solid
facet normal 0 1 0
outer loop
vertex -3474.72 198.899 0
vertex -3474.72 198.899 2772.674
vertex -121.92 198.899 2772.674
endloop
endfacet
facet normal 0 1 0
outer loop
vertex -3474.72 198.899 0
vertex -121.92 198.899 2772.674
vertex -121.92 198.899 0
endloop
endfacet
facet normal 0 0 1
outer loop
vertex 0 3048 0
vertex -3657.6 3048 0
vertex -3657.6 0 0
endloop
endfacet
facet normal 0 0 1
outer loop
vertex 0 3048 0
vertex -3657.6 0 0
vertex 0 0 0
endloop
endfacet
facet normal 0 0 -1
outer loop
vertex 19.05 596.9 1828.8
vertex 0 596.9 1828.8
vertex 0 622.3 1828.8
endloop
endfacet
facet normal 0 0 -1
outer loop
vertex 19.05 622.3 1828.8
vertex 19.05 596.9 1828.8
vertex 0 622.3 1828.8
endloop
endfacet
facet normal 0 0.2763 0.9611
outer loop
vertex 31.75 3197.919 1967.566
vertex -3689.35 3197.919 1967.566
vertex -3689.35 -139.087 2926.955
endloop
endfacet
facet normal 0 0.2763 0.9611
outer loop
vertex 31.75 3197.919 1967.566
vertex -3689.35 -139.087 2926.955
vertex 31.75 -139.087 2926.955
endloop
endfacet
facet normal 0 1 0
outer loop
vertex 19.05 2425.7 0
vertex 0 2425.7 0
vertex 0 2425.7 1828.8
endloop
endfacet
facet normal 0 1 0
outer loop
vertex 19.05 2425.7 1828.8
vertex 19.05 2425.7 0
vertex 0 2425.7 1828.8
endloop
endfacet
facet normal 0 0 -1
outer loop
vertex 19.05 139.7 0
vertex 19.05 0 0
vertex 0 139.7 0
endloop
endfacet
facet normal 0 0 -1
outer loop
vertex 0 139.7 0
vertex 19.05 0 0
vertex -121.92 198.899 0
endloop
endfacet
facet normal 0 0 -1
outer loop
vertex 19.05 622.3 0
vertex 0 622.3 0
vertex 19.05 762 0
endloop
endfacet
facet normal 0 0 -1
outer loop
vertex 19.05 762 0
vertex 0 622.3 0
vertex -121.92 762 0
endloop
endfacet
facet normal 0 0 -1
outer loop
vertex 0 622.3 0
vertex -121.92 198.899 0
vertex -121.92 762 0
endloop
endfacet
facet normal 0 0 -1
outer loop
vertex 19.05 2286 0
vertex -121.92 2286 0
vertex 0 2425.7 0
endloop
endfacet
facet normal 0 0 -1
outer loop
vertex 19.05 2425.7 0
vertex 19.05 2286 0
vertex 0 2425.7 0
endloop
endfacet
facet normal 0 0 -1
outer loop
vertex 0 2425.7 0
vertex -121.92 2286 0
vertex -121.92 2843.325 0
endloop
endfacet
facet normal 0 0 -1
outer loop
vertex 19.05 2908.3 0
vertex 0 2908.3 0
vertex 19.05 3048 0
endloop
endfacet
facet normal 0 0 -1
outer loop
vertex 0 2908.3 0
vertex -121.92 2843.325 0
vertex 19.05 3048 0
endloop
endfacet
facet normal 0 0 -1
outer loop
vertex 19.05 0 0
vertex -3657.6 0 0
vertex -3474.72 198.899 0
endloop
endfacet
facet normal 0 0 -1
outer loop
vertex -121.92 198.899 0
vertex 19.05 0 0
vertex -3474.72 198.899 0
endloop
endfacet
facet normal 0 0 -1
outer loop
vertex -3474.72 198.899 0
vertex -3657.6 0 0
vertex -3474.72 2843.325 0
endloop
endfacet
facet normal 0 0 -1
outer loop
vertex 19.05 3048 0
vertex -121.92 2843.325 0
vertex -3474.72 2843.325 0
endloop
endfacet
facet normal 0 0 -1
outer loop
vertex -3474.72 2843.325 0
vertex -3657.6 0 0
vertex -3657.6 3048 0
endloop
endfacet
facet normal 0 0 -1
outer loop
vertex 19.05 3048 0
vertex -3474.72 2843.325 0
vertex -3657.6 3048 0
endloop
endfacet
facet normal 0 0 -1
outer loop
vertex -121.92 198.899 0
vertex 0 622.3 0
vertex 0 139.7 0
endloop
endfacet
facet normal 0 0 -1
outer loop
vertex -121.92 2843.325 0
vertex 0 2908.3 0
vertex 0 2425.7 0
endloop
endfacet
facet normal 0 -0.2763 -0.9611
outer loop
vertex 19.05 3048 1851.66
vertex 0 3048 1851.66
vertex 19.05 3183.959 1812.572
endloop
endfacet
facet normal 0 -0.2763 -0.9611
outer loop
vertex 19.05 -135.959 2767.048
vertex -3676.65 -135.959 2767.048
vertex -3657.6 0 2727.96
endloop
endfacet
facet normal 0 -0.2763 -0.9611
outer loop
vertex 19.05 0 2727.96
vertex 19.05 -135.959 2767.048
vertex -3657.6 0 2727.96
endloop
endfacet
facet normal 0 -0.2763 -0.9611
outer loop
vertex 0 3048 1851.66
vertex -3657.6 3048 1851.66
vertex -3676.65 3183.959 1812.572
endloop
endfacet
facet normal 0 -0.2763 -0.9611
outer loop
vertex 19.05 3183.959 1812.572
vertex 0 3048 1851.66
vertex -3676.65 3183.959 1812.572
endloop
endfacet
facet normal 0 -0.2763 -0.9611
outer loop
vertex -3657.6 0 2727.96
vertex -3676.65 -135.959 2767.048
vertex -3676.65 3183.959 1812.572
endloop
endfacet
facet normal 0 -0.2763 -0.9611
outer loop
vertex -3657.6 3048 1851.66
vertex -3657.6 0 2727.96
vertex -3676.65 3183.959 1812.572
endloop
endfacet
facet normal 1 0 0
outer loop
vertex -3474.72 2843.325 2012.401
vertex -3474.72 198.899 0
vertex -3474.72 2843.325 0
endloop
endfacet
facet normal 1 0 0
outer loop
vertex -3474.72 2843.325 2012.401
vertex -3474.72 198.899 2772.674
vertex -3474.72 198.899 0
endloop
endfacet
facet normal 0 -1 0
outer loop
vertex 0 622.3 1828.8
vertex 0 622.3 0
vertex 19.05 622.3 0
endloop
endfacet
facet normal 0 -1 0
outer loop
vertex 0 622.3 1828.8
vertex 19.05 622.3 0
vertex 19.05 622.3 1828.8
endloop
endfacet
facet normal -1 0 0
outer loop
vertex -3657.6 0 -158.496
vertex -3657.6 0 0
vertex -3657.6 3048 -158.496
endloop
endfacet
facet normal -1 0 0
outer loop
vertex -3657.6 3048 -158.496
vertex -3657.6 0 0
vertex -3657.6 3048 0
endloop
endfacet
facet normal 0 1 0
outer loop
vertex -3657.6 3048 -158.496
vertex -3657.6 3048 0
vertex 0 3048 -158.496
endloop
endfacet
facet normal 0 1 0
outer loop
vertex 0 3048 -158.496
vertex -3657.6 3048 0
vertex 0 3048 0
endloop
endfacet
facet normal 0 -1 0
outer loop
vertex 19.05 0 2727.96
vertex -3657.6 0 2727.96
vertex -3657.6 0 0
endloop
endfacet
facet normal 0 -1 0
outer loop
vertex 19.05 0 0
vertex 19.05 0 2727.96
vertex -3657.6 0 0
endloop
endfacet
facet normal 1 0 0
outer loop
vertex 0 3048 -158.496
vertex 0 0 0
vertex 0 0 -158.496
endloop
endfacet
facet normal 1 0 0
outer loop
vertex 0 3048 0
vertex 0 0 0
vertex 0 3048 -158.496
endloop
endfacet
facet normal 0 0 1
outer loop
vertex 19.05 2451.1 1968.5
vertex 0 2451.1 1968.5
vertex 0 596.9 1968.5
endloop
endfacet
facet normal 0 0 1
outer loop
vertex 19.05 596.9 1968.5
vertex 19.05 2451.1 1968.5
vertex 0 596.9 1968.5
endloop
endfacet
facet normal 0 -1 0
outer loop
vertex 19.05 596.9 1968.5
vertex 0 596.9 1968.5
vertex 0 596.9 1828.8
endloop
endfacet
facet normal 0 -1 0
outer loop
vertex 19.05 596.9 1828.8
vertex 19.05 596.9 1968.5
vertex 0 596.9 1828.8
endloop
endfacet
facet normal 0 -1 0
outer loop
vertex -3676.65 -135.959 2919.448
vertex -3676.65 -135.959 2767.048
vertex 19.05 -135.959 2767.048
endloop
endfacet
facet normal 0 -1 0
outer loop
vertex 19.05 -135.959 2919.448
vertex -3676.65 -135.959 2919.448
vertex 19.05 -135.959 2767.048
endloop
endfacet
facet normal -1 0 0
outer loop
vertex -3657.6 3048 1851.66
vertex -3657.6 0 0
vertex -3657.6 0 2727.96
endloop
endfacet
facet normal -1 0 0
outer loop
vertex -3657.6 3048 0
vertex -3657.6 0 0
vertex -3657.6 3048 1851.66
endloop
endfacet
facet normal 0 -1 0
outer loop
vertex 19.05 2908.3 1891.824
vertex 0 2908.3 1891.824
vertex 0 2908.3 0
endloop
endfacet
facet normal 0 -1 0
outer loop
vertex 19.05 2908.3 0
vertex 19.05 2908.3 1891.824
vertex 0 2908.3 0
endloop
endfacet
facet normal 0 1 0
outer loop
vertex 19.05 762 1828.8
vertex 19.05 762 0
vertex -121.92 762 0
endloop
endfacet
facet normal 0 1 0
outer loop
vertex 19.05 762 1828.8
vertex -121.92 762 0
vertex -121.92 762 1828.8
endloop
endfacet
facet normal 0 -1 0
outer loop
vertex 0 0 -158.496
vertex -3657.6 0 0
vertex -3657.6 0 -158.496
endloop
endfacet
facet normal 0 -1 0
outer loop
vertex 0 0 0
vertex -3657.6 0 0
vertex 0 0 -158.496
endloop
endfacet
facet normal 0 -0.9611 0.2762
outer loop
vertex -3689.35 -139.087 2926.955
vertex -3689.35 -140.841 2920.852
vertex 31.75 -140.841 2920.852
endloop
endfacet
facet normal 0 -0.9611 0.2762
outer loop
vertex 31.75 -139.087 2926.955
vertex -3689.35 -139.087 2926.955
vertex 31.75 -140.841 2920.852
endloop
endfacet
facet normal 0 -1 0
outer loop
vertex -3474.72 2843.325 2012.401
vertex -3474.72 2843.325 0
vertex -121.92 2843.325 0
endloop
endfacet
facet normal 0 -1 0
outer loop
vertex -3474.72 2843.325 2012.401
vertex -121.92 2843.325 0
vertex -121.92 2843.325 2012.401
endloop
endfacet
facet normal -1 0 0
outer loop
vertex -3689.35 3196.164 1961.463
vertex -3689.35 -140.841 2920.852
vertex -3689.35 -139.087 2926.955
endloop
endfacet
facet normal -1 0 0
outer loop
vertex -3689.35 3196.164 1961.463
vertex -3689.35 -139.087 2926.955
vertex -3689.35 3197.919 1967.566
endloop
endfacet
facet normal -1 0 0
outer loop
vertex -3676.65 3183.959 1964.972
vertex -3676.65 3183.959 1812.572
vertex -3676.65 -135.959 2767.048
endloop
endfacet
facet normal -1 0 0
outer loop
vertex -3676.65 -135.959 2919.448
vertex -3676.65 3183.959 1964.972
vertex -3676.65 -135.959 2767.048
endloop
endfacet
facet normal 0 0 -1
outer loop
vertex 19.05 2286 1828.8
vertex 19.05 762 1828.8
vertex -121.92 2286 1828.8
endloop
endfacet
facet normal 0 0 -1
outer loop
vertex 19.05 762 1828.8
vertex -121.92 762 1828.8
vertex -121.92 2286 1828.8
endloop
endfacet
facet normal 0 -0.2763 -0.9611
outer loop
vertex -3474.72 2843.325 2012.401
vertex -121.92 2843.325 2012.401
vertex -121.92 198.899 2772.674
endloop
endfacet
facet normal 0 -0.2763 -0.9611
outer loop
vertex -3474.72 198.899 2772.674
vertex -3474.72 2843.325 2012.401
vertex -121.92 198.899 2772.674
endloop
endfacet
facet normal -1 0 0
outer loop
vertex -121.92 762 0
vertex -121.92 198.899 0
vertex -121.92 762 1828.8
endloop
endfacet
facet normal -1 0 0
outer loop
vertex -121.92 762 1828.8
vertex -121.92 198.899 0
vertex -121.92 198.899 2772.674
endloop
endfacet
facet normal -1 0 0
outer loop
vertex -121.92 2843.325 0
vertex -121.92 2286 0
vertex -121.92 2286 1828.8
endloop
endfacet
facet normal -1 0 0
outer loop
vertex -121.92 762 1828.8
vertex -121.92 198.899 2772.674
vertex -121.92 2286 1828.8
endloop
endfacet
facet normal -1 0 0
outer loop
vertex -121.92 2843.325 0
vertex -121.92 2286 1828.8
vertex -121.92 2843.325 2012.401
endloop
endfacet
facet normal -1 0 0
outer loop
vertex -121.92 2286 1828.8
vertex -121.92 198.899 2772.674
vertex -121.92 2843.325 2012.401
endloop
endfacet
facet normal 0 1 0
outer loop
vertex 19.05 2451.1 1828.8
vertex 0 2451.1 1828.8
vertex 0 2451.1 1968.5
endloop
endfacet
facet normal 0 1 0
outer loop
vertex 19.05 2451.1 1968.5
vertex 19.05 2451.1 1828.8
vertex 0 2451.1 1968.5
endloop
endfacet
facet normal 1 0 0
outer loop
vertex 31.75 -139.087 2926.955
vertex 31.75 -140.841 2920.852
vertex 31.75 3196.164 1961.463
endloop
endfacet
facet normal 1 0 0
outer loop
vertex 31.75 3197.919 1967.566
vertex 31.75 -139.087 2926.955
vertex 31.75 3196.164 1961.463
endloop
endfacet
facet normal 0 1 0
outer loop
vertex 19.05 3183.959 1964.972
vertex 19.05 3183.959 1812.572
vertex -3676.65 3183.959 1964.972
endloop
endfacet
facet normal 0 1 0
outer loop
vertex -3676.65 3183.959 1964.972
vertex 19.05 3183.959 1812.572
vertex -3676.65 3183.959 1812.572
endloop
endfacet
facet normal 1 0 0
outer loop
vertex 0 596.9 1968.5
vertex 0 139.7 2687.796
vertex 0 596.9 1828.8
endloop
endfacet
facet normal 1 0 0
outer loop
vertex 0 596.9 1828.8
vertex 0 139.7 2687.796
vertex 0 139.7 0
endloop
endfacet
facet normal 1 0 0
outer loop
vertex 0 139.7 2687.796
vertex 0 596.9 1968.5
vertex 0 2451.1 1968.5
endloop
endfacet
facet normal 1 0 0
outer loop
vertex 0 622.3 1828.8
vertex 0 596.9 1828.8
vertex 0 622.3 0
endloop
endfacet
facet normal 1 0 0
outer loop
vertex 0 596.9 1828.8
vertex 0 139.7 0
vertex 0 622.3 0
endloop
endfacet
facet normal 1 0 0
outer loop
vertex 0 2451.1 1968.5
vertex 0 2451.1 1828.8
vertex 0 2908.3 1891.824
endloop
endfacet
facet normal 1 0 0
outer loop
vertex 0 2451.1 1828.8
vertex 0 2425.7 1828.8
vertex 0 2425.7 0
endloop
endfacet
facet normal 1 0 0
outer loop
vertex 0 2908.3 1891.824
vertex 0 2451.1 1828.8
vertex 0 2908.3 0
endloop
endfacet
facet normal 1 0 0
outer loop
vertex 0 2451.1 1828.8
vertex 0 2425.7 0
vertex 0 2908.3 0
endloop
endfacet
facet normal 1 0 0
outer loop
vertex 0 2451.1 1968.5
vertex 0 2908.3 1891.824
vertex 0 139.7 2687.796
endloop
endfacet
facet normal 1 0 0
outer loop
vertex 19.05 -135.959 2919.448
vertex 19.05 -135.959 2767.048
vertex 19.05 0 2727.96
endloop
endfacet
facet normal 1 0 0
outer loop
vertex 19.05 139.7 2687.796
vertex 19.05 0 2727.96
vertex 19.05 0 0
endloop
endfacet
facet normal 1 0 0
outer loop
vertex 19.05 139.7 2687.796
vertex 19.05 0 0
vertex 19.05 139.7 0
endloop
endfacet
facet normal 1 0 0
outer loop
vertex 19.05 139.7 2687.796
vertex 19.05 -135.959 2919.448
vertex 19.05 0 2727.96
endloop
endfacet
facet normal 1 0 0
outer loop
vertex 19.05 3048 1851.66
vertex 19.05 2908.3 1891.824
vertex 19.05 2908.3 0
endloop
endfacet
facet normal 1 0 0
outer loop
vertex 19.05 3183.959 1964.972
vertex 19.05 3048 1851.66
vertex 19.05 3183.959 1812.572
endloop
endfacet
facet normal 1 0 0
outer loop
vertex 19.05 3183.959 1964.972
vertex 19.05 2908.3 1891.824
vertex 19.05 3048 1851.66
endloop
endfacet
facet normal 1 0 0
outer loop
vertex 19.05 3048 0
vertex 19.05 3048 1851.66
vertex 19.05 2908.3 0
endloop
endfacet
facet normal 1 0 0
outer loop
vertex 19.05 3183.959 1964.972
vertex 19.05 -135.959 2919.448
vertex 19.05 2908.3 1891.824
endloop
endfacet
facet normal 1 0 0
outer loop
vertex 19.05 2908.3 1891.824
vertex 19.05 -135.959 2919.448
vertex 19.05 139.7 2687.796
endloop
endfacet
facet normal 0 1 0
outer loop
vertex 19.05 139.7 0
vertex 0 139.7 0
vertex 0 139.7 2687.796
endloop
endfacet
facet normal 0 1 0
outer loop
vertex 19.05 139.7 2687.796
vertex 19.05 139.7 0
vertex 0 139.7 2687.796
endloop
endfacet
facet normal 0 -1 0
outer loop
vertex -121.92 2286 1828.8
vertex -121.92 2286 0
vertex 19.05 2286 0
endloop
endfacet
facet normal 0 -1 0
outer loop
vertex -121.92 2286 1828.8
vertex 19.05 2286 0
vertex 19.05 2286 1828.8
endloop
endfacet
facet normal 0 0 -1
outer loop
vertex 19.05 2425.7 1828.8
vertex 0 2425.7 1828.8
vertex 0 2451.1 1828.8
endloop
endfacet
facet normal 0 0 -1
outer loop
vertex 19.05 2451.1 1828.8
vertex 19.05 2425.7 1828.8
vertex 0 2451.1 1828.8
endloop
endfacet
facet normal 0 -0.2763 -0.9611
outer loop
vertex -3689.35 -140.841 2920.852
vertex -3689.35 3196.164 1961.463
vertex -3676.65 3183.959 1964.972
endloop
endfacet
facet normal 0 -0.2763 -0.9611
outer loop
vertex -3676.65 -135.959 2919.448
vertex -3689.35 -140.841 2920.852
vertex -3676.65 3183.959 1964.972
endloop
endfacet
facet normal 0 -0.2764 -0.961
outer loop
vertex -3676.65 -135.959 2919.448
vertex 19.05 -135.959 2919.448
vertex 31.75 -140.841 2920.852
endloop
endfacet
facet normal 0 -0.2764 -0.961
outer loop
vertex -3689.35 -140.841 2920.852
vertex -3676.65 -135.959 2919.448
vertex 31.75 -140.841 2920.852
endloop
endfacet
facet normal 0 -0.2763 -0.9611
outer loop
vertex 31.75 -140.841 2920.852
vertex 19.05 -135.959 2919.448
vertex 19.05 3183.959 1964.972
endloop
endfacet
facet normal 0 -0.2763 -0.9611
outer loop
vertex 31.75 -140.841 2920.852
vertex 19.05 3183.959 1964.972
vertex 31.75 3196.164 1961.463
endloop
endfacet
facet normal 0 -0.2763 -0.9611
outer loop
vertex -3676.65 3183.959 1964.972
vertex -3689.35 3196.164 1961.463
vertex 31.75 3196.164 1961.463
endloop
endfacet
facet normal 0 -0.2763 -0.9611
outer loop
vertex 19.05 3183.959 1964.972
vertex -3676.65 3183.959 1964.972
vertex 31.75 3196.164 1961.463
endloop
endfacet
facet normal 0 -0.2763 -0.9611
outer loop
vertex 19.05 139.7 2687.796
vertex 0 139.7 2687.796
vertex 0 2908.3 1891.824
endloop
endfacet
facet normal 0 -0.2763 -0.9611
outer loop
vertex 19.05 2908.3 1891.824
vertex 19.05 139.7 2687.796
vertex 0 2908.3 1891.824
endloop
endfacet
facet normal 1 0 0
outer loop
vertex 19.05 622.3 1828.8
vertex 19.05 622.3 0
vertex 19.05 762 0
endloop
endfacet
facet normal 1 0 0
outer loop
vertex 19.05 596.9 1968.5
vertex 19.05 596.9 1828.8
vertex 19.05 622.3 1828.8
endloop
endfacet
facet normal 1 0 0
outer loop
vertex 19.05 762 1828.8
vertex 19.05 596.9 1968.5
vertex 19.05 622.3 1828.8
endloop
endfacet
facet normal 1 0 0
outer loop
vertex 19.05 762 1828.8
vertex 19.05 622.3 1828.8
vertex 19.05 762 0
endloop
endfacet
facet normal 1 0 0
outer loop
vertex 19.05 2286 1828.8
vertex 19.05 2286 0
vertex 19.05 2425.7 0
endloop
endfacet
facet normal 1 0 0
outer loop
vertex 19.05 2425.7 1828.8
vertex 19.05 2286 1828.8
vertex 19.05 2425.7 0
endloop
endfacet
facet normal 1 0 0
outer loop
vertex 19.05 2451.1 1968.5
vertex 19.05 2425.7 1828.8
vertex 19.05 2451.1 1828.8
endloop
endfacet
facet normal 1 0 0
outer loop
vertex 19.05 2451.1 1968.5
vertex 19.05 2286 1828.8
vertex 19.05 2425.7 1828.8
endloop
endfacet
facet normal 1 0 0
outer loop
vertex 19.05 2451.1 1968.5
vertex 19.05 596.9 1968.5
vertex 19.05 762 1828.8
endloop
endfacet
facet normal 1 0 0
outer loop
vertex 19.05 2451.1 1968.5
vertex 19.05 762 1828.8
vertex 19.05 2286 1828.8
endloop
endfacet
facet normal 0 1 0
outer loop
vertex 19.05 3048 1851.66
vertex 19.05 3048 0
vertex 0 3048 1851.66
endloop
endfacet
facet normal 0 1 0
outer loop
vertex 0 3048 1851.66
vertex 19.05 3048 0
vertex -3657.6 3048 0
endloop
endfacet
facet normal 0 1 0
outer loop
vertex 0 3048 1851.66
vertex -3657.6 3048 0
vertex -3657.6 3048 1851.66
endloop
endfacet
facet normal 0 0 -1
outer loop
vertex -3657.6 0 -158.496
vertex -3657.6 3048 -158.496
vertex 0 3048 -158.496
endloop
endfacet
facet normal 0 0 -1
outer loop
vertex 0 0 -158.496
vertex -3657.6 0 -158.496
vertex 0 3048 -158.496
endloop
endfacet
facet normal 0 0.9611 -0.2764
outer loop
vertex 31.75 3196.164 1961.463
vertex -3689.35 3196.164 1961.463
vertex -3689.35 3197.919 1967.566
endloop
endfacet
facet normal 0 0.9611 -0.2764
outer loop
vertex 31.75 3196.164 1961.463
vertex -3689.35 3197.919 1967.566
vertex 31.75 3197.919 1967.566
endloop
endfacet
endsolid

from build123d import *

# Parameters (mm, degrees)
F0_W      = 3657.6
F0_H      = 3048
F1_DEPTH  = 2880.36
F2_SIZE2  = 3047.99999
F2_SIZE   = 876.29999
F3_W      = 3695.7
F3_H      = 3454.4
F3_W_2    = 3657.6
F3_H_2    = 3171.4674224267
F6_W      = 3721.1
F6_H      = 3472.18
F7_DEPTH  = 6.35
F8_W      = 139.7
F8_H      = 1828.8
F9_DEPTH  = 19.05
F10_DEPTH = 121.92
F12_DEPTH = 3352.8
F13_W     = 3657.6
F13_H     = 3048
F14_DEPTH = 158.496


# Not quite as in the source:
# - a fillet or chamfer is up to 0.001 mm smaller than in the source, because OpenCascade refuses the exact size


with BuildPart() as f1:
    # F0 (on Top) → F1 (new body)
    with BuildSketch(Plane.XY):
        with Locations((-1828.8, 1524)):
            Rectangle(F0_W, F0_H)
    extrude(amount=F1_DEPTH)

    # F2 (size 876.3 and 3048 in the source; OpenCascade refuses exactly that, so slightly less here)
    f2_edges = [f1.edges().sort_by_distance(p)[0] for p in [
        (-1828.8, 3048, 2880.36),
    ]]
    f2_side = f1.faces().sort_by_distance((-1828.8, 3048, 1440.18))[0]
    chamfer(f2_edges, length=F2_SIZE, length2=F2_SIZE2, reference=f2_side)

    # F5: sweep along a path in F4
    with BuildLine(Plane.YZ) as f5_path:
        Line((0, 2880.36), (0, 2727.96))
    # F3 (on face) → F5 (sweep)
    with BuildSketch(Plane(origin=(0, 764.8812815702, 2660.4566315486), x_dir=(1, 0, 0), z_dir=(0, 0.2763074249, 0.9610693039))):
        with Locations((-1828.8, 789.8688630733)):
            Rectangle(F3_W, F3_H)
        with Locations((-1828.8, 789.8688664972)):
            Rectangle(F3_W_2, F3_H_2, mode=Mode.SUBTRACT)
    sweep(path=f5_path.line)

    # F6 (on face) → F7 (join)
    with BuildSketch(Plane(origin=(0, 764.8812815702, 2660.4566315486), x_dir=(1, 0, 0), z_dir=(0, 0.2763074249, 0.9610693039))):
        with Locations((-1828.8, 793.6788630733)):
            Rectangle(F6_W, F6_H)
    extrude(amount=F7_DEPTH)

    # F8 (on face) → F9 (join)
    with BuildSketch(Plane.YZ):
        Polygon((0, 2727.96), (0, 0), (139.7, 0), (139.7, 2687.79625), align=None)
        Polygon((2908.3, 0), (3048, 0), (3048, 1851.66), (2908.3, 1891.82375), align=None)
        with Locations((692.15, 914.4)):
            Rectangle(F8_W, F8_H)
        Polygon((622.3, 1828.8), (762, 1828.8), (1524, 1828.8), (2286, 1828.8), (2425.7, 1828.8), (2451.1, 1828.8), (2451.1, 1968.5), (1524, 1968.5), (596.9, 1968.5), (596.9, 1828.8), align=None)
        with Locations((2355.85, 914.4)):
            Rectangle(F8_W, F8_H)
    extrude(amount=F9_DEPTH)

    # F10 (cut): a face of the model
    f10_faces = [f1.faces().sort_by_distance(p)[0] for p in [
        (0, 1524, 914.4),
    ]]
    extrude(f10_faces, amount=-F10_DEPTH, mode=Mode.SUBTRACT)

    # F11 (on face) → F12 (cut)
    with BuildSketch(Plane.YZ.offset(-121.92)):
        Polygon((198.8992989063, 0), (2843.3250255278, 0), (2843.3250255278, 2012.4011538445), (198.8992989063, 2772.6735502481), align=None)
    extrude(amount=-F12_DEPTH, mode=Mode.SUBTRACT)


with BuildPart() as f14:
    # F13 (on Top) → F14 (new body)
    with BuildSketch(Plane.XY):
        with Locations((-1828.8, 1524)):
            Rectangle(F13_W, F13_H)
    extrude(amount=-F14_DEPTH)


solid = Compound([f1.part, f14.part])
